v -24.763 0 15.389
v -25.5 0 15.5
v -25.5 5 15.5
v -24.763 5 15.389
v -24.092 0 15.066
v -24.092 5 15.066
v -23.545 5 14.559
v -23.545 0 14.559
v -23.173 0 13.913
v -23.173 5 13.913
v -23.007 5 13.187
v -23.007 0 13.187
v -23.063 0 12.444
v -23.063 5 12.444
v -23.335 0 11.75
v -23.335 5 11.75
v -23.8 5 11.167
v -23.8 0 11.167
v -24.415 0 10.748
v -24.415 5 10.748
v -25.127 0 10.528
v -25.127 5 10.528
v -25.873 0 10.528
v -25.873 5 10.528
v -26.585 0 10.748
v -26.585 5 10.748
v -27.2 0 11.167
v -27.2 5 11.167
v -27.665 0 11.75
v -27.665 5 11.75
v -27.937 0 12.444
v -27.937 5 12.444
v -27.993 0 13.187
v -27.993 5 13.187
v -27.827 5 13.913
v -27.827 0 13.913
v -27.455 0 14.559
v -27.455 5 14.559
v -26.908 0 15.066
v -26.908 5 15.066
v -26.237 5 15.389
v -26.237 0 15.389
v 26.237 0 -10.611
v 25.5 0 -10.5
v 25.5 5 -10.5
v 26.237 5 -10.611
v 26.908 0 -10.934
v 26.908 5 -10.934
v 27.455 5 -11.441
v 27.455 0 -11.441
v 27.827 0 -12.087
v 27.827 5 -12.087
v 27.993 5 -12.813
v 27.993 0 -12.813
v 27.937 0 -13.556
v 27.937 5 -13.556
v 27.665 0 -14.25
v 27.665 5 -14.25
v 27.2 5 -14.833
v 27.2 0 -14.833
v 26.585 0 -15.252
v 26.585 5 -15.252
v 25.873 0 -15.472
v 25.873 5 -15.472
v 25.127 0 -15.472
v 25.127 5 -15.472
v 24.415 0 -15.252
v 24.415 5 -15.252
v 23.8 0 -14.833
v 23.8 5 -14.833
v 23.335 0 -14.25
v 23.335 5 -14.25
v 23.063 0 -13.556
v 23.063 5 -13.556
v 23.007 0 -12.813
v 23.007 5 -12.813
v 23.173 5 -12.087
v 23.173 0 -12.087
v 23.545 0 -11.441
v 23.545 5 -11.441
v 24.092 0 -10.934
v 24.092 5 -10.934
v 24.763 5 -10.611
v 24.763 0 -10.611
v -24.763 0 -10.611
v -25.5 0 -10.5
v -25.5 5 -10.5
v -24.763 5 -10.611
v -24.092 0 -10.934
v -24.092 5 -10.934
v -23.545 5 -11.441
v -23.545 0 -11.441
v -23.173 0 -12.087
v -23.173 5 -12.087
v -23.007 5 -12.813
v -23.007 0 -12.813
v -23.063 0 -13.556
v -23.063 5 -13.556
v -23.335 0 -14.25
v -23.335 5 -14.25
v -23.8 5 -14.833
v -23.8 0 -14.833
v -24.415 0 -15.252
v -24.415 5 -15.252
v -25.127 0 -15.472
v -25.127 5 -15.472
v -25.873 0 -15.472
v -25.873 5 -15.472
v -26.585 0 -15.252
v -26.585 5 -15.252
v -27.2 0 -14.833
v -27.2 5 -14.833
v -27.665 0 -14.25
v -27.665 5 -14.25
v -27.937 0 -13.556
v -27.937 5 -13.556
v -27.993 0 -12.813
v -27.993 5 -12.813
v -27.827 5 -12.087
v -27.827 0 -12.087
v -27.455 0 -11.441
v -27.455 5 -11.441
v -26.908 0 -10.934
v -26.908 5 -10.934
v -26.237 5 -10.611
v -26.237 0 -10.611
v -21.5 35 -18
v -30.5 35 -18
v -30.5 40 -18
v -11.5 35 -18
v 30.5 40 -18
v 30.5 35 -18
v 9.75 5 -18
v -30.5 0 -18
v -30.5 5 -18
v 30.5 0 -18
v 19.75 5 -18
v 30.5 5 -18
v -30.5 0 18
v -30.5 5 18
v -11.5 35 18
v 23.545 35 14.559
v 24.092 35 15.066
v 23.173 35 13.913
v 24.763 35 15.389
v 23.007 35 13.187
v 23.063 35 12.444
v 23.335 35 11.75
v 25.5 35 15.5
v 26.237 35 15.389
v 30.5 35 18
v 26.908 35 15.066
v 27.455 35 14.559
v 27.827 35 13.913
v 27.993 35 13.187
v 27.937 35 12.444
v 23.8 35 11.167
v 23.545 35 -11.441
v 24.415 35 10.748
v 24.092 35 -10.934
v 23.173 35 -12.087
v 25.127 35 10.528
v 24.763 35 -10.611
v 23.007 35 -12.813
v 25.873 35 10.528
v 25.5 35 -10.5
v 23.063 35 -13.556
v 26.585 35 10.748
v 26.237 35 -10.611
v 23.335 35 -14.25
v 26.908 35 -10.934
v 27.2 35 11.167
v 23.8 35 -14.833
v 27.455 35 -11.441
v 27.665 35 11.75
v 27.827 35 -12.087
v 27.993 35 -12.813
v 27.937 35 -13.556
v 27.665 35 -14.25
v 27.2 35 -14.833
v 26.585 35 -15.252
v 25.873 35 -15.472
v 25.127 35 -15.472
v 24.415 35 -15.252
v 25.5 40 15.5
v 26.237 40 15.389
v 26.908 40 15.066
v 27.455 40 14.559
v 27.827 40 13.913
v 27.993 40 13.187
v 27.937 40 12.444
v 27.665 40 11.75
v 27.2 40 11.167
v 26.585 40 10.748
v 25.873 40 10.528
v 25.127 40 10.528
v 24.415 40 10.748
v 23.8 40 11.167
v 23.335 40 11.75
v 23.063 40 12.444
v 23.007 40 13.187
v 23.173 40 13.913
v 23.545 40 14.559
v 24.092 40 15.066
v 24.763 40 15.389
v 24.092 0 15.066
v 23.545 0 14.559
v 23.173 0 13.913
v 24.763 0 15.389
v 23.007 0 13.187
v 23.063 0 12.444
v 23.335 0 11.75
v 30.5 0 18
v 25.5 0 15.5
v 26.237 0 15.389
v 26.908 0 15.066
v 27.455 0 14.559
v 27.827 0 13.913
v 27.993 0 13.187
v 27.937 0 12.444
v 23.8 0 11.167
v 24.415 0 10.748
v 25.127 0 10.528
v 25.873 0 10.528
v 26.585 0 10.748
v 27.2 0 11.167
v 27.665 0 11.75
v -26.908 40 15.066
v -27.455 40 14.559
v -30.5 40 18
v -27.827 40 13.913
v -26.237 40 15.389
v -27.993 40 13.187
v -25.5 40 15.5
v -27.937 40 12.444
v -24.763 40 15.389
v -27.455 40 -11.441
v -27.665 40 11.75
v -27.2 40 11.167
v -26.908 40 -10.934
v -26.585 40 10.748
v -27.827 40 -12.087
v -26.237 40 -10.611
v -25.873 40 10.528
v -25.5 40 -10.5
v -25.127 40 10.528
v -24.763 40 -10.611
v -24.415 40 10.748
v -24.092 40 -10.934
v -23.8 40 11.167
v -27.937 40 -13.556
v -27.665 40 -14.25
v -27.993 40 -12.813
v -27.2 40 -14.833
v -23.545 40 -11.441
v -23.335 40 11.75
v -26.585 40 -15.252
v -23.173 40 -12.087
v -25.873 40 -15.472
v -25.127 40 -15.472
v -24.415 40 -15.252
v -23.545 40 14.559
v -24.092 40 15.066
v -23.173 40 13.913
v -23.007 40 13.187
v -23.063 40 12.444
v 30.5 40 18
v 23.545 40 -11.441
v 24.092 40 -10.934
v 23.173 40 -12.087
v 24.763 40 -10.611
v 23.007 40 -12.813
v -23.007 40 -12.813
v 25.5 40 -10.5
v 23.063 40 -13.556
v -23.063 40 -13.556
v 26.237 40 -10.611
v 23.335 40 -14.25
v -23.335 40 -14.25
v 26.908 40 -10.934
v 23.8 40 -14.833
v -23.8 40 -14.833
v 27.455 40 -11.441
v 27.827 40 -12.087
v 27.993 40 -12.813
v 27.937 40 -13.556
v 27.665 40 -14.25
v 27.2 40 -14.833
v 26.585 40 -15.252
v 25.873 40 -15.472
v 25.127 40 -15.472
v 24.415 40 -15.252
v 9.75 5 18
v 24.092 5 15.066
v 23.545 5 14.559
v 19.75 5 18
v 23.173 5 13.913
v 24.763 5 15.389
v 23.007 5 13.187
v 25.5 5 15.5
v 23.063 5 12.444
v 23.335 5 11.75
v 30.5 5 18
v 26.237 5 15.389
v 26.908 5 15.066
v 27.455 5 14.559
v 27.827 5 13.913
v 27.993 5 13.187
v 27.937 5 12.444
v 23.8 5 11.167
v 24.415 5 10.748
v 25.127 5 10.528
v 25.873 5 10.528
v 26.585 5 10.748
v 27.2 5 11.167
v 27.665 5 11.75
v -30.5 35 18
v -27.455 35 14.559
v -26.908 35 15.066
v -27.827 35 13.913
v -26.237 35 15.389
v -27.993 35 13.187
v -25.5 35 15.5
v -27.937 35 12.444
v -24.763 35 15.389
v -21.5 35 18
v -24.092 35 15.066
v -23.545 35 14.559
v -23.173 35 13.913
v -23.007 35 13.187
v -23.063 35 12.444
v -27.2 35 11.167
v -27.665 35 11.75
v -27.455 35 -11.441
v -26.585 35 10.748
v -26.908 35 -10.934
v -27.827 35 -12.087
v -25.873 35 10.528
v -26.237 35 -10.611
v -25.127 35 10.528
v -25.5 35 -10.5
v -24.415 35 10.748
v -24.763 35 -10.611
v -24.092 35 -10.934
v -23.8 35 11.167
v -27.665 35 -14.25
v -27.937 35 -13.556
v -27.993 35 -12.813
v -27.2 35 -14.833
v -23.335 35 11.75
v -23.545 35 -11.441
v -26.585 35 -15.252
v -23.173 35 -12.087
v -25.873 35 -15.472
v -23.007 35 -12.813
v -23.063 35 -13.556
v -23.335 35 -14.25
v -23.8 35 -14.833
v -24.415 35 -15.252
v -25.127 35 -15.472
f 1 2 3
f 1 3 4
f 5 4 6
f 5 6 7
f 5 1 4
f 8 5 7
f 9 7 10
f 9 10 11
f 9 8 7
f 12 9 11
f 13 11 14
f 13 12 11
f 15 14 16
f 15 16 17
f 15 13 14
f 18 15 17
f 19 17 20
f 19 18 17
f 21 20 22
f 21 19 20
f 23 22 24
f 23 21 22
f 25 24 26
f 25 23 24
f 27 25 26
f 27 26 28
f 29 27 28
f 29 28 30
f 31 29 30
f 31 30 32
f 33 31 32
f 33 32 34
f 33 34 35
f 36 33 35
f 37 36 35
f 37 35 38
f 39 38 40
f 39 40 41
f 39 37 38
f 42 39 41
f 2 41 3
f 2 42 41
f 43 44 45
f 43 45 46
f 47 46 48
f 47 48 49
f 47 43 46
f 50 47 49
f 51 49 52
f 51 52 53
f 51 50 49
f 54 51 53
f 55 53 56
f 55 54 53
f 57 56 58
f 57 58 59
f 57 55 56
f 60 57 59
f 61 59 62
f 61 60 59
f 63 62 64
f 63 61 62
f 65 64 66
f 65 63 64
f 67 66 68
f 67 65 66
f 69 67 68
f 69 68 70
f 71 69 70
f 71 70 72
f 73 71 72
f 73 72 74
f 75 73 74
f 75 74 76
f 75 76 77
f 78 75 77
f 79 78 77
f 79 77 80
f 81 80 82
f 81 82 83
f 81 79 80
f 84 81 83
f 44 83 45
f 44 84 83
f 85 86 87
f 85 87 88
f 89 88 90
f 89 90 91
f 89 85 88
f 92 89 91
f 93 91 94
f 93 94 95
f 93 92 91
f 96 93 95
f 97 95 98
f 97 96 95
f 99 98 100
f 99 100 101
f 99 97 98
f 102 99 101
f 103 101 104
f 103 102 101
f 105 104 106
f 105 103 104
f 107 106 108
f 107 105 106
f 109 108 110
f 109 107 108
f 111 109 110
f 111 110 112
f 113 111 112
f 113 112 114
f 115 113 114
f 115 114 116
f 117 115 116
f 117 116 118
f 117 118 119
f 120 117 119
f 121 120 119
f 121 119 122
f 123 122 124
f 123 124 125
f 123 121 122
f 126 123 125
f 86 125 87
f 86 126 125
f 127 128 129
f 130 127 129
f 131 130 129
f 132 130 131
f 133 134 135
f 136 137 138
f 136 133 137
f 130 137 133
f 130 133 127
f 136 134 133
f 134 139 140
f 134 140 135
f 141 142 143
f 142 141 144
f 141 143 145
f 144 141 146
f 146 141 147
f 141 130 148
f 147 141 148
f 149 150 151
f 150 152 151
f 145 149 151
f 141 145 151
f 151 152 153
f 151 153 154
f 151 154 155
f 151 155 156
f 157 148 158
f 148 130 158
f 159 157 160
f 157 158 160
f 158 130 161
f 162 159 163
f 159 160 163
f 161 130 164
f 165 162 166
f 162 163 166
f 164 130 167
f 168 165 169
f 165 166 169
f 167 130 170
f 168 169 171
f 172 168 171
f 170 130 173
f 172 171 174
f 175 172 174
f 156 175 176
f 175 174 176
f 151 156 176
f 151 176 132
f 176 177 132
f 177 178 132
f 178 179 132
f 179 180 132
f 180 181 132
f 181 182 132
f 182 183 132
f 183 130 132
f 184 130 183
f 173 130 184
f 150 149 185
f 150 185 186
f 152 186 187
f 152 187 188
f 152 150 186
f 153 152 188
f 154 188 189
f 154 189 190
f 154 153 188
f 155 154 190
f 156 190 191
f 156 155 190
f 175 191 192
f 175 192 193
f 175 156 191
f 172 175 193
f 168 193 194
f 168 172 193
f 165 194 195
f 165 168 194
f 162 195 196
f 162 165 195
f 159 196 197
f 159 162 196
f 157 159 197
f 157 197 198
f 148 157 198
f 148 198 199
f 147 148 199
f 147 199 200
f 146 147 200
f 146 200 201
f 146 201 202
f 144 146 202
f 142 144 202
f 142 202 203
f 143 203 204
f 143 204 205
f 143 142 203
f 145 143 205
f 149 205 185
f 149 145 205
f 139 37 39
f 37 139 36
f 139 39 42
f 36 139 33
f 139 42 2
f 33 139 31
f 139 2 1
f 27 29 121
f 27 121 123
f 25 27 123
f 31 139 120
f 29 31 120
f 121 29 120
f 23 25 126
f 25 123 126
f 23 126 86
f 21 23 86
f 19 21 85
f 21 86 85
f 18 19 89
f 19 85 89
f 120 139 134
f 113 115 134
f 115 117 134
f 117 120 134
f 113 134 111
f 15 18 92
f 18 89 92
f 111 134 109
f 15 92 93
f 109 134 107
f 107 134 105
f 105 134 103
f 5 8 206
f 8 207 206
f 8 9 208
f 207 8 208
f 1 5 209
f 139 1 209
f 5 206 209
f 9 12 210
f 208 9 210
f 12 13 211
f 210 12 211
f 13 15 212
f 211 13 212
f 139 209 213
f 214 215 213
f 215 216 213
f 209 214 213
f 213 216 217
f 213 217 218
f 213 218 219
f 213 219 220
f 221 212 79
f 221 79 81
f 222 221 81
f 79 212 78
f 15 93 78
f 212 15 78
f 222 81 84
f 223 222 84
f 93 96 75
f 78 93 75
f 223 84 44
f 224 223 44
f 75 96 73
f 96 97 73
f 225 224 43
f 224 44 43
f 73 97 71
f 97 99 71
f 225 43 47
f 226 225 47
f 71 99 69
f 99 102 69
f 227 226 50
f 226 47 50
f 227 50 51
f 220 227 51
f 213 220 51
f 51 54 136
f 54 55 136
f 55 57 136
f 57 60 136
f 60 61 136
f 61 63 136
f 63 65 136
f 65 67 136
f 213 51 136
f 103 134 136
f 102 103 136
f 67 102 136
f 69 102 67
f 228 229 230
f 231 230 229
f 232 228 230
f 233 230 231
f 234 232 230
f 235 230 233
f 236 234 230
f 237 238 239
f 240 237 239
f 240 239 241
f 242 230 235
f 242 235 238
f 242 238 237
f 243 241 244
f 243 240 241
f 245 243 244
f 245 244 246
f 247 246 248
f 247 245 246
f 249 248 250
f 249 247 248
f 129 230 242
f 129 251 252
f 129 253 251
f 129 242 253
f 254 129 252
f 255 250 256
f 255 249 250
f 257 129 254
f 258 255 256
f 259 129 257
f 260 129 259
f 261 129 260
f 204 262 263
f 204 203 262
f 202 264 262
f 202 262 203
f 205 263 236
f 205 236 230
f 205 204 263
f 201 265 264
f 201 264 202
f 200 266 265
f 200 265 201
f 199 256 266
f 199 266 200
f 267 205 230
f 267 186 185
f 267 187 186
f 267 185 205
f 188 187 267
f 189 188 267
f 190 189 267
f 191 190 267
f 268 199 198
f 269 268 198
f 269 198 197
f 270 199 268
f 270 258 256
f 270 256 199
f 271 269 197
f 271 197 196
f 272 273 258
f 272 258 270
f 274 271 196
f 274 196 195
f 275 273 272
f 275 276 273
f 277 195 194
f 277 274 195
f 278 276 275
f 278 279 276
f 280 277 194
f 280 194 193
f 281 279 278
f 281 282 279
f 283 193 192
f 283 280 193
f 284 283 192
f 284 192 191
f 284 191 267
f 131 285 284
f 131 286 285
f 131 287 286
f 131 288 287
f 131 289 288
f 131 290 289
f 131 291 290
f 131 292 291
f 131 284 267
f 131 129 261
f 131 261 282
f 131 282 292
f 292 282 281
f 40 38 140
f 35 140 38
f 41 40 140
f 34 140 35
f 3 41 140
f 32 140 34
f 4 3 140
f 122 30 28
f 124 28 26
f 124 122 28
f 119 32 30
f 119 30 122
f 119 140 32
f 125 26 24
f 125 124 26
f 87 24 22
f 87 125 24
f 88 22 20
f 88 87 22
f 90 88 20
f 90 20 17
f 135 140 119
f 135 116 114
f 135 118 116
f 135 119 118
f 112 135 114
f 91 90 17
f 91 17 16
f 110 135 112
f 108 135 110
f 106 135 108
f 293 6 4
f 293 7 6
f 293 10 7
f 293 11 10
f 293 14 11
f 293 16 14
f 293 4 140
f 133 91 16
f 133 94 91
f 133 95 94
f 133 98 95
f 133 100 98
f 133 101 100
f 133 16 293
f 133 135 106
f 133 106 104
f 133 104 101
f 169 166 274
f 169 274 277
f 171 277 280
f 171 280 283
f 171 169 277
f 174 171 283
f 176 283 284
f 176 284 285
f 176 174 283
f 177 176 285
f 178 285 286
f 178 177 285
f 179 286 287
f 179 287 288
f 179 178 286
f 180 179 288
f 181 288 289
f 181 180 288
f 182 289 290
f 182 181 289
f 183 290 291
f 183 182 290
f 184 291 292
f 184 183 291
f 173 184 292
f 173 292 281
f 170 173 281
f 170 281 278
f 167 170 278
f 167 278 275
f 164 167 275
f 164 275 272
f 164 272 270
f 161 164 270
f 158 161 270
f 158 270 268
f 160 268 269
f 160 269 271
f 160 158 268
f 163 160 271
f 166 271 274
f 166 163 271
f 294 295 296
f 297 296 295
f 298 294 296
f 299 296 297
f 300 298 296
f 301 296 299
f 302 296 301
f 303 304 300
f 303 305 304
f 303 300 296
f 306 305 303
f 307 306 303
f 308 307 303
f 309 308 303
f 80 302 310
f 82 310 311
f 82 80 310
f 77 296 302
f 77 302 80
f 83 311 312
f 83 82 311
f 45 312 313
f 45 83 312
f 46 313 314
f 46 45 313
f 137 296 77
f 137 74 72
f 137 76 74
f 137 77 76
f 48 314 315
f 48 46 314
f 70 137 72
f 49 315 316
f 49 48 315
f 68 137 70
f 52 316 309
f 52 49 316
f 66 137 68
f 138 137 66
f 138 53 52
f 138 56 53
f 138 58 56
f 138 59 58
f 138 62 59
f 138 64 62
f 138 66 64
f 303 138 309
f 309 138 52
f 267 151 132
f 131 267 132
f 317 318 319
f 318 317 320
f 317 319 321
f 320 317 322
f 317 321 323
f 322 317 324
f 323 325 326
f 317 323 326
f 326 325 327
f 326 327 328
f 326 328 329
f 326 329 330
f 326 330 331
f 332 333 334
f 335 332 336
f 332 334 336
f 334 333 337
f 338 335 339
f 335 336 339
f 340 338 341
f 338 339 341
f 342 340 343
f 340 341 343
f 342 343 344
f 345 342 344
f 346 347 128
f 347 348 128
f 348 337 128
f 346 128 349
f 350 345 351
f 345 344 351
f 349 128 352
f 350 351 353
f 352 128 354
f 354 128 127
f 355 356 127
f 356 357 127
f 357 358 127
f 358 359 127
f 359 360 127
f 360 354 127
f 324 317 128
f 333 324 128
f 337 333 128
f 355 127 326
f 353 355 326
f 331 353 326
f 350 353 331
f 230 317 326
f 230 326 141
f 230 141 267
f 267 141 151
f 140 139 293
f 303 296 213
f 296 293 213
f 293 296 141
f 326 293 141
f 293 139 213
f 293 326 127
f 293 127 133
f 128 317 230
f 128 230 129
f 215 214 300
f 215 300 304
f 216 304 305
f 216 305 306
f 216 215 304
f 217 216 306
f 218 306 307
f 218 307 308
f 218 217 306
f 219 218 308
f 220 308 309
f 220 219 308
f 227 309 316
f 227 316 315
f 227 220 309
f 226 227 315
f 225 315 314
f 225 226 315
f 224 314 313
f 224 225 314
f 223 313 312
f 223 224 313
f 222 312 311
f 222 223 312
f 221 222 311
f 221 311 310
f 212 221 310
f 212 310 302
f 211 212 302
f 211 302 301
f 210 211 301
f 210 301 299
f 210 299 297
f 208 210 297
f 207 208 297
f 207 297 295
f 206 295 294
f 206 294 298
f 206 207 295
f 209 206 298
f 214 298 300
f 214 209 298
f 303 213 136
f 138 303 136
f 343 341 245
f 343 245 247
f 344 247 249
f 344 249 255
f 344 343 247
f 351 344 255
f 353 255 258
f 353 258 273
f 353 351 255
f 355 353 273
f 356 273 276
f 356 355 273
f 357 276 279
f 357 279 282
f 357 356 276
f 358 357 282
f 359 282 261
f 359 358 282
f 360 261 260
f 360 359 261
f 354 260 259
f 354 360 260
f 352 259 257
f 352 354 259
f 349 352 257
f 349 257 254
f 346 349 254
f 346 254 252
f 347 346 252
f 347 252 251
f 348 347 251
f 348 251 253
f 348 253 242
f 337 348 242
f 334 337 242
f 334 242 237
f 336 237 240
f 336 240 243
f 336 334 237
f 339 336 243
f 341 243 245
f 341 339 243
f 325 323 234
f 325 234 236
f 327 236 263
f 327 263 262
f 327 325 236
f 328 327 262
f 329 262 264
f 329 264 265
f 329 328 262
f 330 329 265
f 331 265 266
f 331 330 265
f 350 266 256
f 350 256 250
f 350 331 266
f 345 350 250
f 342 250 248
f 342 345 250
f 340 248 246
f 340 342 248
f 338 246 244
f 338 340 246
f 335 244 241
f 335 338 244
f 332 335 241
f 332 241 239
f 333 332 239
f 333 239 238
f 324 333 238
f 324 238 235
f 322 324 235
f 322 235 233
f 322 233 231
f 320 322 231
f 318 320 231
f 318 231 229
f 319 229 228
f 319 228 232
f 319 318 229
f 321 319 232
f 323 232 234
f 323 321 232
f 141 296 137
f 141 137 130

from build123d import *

# Parameters (mm, degrees)
SKETCH1_W           = 61
SKETCH1_H           = 36
SKETCH1_R           = 2.5
BOSS_EXTRUDE1_DEPTH = 5
BOSS_EXTRUDE3_DEPTH = 36
SKETCH5_W           = 61
SKETCH5_H           = 36
SKETCH5_R           = 2.5
BOSS_EXTRUDE4_DEPTH = 5


with BuildPart() as part:
    # Sketch1 → Boss-Extrude1 (new body)
    with BuildSketch(Plane(origin=(0, 0, 0), x_dir=(1, 0, 0), z_dir=(0, 1, 0))):
        Rectangle(SKETCH1_W, SKETCH1_H)
        with Locations(Location((-25.5, 13, 0), (0, 0, 270))):
            Circle(SKETCH1_R, mode=Mode.SUBTRACT)
        with Locations(Location((25.5, 13, 0), (0, 0, 270))):
            Circle(SKETCH1_R, mode=Mode.SUBTRACT)
        with Locations(Location((25.5, -13, 0), (0, 0, 270))):
            Circle(SKETCH1_R, mode=Mode.SUBTRACT)
        with Locations(Location((-25.5, -13, 0), (0, 0, 270))):
            Circle(SKETCH1_R, mode=Mode.SUBTRACT)
    extrude(amount=BOSS_EXTRUDE1_DEPTH)

    # Sketch4 → Boss-Extrude3 (add)
    with BuildSketch(Plane.XY.offset(18)):
        Polygon((19.75, 5), (-11.5, 35), (-21.5, 35), (9.75, 5), align=None)
    extrude(amount=-BOSS_EXTRUDE3_DEPTH)

    # Sketch5 → Boss-Extrude4 (add)
    with BuildSketch(Plane(origin=(0, 35, 0), x_dir=(1, 0, 0), z_dir=(0, 1, 0))):
        Rectangle(SKETCH5_W, SKETCH5_H)
        with Locations(Location((-25.5, -13, 0), (0, 0, 270))):
            Circle(SKETCH5_R, mode=Mode.SUBTRACT)
        with Locations(Location((-25.5, 13, 0), (0, 0, 270))):
            Circle(SKETCH5_R, mode=Mode.SUBTRACT)
        with Locations(Location((25.5, 13, 0), (0, 0, 270))):
            Circle(SKETCH5_R, mode=Mode.SUBTRACT)
        with Locations(Location((25.5, -13, 0), (0, 0, 270))):
            Circle(SKETCH5_R, mode=Mode.SUBTRACT)
    extrude(amount=BOSS_EXTRUDE4_DEPTH)


solid = part.part
